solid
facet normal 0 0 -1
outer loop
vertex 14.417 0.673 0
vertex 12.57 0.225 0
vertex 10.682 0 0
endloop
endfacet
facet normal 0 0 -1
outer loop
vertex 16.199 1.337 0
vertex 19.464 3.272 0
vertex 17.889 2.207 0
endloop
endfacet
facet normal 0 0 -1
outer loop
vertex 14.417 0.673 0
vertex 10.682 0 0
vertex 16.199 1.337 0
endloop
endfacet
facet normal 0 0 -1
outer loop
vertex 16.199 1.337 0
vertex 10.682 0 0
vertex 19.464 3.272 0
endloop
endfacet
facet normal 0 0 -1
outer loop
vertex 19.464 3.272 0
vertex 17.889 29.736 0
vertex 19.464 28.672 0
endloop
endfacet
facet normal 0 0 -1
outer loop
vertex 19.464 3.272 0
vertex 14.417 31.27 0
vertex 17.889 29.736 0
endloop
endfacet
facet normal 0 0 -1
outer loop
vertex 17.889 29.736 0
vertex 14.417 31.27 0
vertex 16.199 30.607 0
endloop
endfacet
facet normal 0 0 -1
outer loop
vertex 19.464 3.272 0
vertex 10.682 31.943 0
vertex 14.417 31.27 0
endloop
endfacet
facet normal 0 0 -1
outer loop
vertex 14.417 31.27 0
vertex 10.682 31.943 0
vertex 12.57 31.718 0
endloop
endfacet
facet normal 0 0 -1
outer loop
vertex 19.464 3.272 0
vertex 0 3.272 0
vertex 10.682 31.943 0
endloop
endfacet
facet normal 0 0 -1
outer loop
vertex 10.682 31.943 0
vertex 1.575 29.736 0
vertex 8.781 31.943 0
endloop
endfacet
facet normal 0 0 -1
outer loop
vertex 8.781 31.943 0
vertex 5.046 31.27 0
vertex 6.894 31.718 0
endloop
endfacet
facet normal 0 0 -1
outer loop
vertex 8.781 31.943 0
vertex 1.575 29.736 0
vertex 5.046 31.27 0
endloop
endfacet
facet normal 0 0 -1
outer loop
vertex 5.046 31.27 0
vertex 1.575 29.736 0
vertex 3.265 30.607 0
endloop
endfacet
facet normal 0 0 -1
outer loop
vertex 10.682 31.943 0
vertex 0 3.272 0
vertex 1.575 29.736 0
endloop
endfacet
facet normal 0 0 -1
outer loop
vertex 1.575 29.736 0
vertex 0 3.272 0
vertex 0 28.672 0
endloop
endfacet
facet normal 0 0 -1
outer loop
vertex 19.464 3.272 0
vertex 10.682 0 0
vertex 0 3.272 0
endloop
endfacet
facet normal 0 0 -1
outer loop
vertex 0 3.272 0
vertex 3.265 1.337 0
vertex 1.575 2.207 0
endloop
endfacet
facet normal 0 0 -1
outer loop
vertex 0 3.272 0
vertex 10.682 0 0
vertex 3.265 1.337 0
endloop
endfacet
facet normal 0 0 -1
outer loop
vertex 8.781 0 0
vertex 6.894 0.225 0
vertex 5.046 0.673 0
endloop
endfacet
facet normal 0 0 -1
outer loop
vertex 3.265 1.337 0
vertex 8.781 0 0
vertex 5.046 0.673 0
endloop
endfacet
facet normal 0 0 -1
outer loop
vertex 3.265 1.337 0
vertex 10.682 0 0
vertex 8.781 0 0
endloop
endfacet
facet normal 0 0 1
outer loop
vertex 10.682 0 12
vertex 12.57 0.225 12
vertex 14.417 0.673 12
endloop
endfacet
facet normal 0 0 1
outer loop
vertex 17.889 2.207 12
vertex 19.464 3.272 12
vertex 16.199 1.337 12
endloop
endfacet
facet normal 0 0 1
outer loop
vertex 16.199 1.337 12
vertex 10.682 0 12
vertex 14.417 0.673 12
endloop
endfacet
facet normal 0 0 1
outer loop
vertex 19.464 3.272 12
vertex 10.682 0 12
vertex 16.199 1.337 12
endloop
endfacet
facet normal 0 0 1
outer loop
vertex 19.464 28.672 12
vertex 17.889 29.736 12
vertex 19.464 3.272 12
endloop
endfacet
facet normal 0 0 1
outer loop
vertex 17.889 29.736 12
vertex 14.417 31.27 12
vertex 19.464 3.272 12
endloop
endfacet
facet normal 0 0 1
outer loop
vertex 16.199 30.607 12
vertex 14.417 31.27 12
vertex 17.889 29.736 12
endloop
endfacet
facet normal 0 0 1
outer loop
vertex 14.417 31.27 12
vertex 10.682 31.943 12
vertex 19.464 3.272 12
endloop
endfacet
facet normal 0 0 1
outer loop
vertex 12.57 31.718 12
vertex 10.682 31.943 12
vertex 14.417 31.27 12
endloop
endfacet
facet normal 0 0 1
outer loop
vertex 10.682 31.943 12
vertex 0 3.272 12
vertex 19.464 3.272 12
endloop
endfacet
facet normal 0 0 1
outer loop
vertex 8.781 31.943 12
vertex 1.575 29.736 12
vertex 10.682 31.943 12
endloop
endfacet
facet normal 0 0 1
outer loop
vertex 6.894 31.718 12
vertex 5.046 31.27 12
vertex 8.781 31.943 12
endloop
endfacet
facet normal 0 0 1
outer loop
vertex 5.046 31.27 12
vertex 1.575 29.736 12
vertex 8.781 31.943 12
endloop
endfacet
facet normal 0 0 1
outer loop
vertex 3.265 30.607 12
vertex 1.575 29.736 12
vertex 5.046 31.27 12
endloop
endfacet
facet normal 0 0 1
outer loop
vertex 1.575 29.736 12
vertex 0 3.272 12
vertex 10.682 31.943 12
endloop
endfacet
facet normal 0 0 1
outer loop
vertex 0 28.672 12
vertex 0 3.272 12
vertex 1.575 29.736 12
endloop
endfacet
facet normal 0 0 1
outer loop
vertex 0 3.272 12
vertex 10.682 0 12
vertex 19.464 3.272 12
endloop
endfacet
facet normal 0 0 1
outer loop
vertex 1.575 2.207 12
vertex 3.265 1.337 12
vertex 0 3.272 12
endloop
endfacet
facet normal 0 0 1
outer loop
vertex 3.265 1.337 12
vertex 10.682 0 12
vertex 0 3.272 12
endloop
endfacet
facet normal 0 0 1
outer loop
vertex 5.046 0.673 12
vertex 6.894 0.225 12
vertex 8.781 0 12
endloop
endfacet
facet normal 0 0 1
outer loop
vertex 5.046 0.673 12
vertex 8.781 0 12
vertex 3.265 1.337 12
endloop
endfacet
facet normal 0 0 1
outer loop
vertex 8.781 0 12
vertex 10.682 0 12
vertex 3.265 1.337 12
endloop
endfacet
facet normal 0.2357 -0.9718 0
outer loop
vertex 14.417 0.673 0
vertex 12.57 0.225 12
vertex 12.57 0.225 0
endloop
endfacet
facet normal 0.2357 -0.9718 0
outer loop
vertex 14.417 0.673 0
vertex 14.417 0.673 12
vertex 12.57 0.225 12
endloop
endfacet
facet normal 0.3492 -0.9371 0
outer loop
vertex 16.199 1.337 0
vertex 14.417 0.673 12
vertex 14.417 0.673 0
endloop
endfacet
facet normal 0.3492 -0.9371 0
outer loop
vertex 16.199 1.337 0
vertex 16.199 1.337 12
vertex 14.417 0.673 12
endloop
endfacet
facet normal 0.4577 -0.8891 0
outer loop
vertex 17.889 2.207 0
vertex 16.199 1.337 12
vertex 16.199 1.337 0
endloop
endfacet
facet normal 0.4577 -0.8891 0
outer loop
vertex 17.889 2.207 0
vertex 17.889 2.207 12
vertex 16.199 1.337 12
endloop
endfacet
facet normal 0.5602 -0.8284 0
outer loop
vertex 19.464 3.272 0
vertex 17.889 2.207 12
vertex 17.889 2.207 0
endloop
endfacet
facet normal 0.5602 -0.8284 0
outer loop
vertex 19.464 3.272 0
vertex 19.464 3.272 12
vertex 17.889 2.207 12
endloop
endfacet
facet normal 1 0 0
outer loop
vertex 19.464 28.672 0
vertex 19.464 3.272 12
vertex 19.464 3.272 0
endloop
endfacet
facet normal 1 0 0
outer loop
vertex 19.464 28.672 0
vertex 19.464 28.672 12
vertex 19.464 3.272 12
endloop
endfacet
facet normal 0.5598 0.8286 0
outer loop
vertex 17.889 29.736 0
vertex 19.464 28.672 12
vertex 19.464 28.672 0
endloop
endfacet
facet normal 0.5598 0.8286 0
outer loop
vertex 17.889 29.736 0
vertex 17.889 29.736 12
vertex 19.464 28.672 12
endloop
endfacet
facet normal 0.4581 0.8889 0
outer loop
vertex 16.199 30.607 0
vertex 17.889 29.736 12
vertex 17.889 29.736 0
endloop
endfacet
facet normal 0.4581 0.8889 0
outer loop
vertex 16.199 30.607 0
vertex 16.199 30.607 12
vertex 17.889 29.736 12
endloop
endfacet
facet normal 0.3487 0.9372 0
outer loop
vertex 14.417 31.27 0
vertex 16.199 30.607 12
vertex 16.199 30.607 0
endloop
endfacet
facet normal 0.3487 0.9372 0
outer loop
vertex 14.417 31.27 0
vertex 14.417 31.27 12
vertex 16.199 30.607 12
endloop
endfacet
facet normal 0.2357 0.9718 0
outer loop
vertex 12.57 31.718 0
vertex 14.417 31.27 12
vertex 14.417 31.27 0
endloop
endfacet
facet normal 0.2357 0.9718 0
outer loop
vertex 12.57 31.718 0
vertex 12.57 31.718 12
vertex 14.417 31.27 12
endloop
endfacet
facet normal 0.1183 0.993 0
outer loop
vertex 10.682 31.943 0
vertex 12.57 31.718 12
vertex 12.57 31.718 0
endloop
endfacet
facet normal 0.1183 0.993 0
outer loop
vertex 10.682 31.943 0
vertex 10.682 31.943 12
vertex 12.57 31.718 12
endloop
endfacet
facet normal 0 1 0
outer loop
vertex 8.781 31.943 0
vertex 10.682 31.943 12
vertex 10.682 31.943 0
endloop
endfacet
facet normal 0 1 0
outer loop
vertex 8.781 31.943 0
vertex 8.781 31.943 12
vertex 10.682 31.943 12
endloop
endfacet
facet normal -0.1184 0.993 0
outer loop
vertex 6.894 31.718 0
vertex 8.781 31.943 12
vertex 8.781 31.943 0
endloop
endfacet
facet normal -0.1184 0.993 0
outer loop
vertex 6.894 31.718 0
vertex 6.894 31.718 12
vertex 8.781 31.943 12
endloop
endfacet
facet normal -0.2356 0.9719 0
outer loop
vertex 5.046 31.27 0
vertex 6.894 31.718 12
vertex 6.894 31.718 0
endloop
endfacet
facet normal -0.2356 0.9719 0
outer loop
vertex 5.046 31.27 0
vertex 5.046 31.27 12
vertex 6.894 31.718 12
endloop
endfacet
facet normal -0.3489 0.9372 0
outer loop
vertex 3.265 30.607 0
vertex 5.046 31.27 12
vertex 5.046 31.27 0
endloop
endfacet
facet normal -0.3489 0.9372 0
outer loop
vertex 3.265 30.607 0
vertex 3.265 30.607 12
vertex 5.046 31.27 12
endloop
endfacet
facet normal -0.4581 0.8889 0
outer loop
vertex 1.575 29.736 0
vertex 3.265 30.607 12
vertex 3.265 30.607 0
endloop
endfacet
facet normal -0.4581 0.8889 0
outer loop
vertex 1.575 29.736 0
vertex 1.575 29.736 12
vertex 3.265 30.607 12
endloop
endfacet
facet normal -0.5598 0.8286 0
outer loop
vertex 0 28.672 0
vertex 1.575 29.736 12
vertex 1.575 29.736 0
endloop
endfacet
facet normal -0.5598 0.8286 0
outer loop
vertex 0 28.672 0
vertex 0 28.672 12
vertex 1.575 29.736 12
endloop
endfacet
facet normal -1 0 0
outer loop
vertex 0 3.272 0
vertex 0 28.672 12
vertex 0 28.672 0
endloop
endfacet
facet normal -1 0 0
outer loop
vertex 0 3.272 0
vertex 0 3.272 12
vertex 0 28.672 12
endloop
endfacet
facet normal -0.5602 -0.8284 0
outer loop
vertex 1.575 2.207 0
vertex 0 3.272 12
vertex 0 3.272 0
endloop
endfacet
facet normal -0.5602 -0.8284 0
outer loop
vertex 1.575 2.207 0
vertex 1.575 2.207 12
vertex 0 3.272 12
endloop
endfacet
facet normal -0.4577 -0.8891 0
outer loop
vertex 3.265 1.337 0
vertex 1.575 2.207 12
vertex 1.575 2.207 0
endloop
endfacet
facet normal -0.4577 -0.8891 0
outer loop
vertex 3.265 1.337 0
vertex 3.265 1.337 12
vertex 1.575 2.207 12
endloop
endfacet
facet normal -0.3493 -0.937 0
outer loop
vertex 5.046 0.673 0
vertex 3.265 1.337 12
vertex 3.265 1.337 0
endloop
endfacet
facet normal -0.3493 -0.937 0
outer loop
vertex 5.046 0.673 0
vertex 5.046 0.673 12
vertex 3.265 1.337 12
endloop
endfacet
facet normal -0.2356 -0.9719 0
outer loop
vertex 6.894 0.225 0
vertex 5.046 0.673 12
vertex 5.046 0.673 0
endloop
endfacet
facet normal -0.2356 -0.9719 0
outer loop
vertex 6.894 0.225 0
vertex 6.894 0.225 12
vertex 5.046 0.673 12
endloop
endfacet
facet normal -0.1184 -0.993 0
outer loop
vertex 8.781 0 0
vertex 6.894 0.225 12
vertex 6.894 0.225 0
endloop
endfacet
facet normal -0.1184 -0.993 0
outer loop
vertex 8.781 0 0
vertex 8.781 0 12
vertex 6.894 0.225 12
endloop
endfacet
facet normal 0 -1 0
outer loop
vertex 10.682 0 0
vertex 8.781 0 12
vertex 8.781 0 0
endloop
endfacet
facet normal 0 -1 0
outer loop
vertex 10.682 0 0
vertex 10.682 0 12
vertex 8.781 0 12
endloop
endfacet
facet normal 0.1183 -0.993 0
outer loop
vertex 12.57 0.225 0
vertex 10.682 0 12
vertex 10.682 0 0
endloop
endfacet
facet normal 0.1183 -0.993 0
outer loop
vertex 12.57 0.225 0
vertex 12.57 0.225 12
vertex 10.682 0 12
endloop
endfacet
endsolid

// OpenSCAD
$fn = 32;

// ----------------------------------------------------------------------
// Flat adaptor: double_d, 12 mm thick
// ----------------------------------------------------------------------

// --- parameters (mm) ---
profile_height = 12;      // extrusion height
profile_points = 24;      // points of the closed outline

profile = [[19.464, 28.672], [17.889, 29.736], [16.199, 30.607], [14.417, 31.27], [12.57, 31.718], [10.682, 31.943], [8.781, 31.943], [6.894, 31.718], [5.046, 31.27], [3.265, 30.607], [1.575, 29.736], [0, 28.672], [0, 3.272], [1.575, 2.207], [3.265, 1.337], [5.046, 0.673], [6.894, 0.225], [8.781, 0], [10.682, 0], [12.57, 0.225], [14.417, 0.673], [16.199, 1.337], [17.889, 2.207], [19.464, 3.272]];  // single closed polygon, 24 points, counter clockwise

// --- the one profile operation ---
linear_extrude(height = profile_height) polygon(points = profile);
